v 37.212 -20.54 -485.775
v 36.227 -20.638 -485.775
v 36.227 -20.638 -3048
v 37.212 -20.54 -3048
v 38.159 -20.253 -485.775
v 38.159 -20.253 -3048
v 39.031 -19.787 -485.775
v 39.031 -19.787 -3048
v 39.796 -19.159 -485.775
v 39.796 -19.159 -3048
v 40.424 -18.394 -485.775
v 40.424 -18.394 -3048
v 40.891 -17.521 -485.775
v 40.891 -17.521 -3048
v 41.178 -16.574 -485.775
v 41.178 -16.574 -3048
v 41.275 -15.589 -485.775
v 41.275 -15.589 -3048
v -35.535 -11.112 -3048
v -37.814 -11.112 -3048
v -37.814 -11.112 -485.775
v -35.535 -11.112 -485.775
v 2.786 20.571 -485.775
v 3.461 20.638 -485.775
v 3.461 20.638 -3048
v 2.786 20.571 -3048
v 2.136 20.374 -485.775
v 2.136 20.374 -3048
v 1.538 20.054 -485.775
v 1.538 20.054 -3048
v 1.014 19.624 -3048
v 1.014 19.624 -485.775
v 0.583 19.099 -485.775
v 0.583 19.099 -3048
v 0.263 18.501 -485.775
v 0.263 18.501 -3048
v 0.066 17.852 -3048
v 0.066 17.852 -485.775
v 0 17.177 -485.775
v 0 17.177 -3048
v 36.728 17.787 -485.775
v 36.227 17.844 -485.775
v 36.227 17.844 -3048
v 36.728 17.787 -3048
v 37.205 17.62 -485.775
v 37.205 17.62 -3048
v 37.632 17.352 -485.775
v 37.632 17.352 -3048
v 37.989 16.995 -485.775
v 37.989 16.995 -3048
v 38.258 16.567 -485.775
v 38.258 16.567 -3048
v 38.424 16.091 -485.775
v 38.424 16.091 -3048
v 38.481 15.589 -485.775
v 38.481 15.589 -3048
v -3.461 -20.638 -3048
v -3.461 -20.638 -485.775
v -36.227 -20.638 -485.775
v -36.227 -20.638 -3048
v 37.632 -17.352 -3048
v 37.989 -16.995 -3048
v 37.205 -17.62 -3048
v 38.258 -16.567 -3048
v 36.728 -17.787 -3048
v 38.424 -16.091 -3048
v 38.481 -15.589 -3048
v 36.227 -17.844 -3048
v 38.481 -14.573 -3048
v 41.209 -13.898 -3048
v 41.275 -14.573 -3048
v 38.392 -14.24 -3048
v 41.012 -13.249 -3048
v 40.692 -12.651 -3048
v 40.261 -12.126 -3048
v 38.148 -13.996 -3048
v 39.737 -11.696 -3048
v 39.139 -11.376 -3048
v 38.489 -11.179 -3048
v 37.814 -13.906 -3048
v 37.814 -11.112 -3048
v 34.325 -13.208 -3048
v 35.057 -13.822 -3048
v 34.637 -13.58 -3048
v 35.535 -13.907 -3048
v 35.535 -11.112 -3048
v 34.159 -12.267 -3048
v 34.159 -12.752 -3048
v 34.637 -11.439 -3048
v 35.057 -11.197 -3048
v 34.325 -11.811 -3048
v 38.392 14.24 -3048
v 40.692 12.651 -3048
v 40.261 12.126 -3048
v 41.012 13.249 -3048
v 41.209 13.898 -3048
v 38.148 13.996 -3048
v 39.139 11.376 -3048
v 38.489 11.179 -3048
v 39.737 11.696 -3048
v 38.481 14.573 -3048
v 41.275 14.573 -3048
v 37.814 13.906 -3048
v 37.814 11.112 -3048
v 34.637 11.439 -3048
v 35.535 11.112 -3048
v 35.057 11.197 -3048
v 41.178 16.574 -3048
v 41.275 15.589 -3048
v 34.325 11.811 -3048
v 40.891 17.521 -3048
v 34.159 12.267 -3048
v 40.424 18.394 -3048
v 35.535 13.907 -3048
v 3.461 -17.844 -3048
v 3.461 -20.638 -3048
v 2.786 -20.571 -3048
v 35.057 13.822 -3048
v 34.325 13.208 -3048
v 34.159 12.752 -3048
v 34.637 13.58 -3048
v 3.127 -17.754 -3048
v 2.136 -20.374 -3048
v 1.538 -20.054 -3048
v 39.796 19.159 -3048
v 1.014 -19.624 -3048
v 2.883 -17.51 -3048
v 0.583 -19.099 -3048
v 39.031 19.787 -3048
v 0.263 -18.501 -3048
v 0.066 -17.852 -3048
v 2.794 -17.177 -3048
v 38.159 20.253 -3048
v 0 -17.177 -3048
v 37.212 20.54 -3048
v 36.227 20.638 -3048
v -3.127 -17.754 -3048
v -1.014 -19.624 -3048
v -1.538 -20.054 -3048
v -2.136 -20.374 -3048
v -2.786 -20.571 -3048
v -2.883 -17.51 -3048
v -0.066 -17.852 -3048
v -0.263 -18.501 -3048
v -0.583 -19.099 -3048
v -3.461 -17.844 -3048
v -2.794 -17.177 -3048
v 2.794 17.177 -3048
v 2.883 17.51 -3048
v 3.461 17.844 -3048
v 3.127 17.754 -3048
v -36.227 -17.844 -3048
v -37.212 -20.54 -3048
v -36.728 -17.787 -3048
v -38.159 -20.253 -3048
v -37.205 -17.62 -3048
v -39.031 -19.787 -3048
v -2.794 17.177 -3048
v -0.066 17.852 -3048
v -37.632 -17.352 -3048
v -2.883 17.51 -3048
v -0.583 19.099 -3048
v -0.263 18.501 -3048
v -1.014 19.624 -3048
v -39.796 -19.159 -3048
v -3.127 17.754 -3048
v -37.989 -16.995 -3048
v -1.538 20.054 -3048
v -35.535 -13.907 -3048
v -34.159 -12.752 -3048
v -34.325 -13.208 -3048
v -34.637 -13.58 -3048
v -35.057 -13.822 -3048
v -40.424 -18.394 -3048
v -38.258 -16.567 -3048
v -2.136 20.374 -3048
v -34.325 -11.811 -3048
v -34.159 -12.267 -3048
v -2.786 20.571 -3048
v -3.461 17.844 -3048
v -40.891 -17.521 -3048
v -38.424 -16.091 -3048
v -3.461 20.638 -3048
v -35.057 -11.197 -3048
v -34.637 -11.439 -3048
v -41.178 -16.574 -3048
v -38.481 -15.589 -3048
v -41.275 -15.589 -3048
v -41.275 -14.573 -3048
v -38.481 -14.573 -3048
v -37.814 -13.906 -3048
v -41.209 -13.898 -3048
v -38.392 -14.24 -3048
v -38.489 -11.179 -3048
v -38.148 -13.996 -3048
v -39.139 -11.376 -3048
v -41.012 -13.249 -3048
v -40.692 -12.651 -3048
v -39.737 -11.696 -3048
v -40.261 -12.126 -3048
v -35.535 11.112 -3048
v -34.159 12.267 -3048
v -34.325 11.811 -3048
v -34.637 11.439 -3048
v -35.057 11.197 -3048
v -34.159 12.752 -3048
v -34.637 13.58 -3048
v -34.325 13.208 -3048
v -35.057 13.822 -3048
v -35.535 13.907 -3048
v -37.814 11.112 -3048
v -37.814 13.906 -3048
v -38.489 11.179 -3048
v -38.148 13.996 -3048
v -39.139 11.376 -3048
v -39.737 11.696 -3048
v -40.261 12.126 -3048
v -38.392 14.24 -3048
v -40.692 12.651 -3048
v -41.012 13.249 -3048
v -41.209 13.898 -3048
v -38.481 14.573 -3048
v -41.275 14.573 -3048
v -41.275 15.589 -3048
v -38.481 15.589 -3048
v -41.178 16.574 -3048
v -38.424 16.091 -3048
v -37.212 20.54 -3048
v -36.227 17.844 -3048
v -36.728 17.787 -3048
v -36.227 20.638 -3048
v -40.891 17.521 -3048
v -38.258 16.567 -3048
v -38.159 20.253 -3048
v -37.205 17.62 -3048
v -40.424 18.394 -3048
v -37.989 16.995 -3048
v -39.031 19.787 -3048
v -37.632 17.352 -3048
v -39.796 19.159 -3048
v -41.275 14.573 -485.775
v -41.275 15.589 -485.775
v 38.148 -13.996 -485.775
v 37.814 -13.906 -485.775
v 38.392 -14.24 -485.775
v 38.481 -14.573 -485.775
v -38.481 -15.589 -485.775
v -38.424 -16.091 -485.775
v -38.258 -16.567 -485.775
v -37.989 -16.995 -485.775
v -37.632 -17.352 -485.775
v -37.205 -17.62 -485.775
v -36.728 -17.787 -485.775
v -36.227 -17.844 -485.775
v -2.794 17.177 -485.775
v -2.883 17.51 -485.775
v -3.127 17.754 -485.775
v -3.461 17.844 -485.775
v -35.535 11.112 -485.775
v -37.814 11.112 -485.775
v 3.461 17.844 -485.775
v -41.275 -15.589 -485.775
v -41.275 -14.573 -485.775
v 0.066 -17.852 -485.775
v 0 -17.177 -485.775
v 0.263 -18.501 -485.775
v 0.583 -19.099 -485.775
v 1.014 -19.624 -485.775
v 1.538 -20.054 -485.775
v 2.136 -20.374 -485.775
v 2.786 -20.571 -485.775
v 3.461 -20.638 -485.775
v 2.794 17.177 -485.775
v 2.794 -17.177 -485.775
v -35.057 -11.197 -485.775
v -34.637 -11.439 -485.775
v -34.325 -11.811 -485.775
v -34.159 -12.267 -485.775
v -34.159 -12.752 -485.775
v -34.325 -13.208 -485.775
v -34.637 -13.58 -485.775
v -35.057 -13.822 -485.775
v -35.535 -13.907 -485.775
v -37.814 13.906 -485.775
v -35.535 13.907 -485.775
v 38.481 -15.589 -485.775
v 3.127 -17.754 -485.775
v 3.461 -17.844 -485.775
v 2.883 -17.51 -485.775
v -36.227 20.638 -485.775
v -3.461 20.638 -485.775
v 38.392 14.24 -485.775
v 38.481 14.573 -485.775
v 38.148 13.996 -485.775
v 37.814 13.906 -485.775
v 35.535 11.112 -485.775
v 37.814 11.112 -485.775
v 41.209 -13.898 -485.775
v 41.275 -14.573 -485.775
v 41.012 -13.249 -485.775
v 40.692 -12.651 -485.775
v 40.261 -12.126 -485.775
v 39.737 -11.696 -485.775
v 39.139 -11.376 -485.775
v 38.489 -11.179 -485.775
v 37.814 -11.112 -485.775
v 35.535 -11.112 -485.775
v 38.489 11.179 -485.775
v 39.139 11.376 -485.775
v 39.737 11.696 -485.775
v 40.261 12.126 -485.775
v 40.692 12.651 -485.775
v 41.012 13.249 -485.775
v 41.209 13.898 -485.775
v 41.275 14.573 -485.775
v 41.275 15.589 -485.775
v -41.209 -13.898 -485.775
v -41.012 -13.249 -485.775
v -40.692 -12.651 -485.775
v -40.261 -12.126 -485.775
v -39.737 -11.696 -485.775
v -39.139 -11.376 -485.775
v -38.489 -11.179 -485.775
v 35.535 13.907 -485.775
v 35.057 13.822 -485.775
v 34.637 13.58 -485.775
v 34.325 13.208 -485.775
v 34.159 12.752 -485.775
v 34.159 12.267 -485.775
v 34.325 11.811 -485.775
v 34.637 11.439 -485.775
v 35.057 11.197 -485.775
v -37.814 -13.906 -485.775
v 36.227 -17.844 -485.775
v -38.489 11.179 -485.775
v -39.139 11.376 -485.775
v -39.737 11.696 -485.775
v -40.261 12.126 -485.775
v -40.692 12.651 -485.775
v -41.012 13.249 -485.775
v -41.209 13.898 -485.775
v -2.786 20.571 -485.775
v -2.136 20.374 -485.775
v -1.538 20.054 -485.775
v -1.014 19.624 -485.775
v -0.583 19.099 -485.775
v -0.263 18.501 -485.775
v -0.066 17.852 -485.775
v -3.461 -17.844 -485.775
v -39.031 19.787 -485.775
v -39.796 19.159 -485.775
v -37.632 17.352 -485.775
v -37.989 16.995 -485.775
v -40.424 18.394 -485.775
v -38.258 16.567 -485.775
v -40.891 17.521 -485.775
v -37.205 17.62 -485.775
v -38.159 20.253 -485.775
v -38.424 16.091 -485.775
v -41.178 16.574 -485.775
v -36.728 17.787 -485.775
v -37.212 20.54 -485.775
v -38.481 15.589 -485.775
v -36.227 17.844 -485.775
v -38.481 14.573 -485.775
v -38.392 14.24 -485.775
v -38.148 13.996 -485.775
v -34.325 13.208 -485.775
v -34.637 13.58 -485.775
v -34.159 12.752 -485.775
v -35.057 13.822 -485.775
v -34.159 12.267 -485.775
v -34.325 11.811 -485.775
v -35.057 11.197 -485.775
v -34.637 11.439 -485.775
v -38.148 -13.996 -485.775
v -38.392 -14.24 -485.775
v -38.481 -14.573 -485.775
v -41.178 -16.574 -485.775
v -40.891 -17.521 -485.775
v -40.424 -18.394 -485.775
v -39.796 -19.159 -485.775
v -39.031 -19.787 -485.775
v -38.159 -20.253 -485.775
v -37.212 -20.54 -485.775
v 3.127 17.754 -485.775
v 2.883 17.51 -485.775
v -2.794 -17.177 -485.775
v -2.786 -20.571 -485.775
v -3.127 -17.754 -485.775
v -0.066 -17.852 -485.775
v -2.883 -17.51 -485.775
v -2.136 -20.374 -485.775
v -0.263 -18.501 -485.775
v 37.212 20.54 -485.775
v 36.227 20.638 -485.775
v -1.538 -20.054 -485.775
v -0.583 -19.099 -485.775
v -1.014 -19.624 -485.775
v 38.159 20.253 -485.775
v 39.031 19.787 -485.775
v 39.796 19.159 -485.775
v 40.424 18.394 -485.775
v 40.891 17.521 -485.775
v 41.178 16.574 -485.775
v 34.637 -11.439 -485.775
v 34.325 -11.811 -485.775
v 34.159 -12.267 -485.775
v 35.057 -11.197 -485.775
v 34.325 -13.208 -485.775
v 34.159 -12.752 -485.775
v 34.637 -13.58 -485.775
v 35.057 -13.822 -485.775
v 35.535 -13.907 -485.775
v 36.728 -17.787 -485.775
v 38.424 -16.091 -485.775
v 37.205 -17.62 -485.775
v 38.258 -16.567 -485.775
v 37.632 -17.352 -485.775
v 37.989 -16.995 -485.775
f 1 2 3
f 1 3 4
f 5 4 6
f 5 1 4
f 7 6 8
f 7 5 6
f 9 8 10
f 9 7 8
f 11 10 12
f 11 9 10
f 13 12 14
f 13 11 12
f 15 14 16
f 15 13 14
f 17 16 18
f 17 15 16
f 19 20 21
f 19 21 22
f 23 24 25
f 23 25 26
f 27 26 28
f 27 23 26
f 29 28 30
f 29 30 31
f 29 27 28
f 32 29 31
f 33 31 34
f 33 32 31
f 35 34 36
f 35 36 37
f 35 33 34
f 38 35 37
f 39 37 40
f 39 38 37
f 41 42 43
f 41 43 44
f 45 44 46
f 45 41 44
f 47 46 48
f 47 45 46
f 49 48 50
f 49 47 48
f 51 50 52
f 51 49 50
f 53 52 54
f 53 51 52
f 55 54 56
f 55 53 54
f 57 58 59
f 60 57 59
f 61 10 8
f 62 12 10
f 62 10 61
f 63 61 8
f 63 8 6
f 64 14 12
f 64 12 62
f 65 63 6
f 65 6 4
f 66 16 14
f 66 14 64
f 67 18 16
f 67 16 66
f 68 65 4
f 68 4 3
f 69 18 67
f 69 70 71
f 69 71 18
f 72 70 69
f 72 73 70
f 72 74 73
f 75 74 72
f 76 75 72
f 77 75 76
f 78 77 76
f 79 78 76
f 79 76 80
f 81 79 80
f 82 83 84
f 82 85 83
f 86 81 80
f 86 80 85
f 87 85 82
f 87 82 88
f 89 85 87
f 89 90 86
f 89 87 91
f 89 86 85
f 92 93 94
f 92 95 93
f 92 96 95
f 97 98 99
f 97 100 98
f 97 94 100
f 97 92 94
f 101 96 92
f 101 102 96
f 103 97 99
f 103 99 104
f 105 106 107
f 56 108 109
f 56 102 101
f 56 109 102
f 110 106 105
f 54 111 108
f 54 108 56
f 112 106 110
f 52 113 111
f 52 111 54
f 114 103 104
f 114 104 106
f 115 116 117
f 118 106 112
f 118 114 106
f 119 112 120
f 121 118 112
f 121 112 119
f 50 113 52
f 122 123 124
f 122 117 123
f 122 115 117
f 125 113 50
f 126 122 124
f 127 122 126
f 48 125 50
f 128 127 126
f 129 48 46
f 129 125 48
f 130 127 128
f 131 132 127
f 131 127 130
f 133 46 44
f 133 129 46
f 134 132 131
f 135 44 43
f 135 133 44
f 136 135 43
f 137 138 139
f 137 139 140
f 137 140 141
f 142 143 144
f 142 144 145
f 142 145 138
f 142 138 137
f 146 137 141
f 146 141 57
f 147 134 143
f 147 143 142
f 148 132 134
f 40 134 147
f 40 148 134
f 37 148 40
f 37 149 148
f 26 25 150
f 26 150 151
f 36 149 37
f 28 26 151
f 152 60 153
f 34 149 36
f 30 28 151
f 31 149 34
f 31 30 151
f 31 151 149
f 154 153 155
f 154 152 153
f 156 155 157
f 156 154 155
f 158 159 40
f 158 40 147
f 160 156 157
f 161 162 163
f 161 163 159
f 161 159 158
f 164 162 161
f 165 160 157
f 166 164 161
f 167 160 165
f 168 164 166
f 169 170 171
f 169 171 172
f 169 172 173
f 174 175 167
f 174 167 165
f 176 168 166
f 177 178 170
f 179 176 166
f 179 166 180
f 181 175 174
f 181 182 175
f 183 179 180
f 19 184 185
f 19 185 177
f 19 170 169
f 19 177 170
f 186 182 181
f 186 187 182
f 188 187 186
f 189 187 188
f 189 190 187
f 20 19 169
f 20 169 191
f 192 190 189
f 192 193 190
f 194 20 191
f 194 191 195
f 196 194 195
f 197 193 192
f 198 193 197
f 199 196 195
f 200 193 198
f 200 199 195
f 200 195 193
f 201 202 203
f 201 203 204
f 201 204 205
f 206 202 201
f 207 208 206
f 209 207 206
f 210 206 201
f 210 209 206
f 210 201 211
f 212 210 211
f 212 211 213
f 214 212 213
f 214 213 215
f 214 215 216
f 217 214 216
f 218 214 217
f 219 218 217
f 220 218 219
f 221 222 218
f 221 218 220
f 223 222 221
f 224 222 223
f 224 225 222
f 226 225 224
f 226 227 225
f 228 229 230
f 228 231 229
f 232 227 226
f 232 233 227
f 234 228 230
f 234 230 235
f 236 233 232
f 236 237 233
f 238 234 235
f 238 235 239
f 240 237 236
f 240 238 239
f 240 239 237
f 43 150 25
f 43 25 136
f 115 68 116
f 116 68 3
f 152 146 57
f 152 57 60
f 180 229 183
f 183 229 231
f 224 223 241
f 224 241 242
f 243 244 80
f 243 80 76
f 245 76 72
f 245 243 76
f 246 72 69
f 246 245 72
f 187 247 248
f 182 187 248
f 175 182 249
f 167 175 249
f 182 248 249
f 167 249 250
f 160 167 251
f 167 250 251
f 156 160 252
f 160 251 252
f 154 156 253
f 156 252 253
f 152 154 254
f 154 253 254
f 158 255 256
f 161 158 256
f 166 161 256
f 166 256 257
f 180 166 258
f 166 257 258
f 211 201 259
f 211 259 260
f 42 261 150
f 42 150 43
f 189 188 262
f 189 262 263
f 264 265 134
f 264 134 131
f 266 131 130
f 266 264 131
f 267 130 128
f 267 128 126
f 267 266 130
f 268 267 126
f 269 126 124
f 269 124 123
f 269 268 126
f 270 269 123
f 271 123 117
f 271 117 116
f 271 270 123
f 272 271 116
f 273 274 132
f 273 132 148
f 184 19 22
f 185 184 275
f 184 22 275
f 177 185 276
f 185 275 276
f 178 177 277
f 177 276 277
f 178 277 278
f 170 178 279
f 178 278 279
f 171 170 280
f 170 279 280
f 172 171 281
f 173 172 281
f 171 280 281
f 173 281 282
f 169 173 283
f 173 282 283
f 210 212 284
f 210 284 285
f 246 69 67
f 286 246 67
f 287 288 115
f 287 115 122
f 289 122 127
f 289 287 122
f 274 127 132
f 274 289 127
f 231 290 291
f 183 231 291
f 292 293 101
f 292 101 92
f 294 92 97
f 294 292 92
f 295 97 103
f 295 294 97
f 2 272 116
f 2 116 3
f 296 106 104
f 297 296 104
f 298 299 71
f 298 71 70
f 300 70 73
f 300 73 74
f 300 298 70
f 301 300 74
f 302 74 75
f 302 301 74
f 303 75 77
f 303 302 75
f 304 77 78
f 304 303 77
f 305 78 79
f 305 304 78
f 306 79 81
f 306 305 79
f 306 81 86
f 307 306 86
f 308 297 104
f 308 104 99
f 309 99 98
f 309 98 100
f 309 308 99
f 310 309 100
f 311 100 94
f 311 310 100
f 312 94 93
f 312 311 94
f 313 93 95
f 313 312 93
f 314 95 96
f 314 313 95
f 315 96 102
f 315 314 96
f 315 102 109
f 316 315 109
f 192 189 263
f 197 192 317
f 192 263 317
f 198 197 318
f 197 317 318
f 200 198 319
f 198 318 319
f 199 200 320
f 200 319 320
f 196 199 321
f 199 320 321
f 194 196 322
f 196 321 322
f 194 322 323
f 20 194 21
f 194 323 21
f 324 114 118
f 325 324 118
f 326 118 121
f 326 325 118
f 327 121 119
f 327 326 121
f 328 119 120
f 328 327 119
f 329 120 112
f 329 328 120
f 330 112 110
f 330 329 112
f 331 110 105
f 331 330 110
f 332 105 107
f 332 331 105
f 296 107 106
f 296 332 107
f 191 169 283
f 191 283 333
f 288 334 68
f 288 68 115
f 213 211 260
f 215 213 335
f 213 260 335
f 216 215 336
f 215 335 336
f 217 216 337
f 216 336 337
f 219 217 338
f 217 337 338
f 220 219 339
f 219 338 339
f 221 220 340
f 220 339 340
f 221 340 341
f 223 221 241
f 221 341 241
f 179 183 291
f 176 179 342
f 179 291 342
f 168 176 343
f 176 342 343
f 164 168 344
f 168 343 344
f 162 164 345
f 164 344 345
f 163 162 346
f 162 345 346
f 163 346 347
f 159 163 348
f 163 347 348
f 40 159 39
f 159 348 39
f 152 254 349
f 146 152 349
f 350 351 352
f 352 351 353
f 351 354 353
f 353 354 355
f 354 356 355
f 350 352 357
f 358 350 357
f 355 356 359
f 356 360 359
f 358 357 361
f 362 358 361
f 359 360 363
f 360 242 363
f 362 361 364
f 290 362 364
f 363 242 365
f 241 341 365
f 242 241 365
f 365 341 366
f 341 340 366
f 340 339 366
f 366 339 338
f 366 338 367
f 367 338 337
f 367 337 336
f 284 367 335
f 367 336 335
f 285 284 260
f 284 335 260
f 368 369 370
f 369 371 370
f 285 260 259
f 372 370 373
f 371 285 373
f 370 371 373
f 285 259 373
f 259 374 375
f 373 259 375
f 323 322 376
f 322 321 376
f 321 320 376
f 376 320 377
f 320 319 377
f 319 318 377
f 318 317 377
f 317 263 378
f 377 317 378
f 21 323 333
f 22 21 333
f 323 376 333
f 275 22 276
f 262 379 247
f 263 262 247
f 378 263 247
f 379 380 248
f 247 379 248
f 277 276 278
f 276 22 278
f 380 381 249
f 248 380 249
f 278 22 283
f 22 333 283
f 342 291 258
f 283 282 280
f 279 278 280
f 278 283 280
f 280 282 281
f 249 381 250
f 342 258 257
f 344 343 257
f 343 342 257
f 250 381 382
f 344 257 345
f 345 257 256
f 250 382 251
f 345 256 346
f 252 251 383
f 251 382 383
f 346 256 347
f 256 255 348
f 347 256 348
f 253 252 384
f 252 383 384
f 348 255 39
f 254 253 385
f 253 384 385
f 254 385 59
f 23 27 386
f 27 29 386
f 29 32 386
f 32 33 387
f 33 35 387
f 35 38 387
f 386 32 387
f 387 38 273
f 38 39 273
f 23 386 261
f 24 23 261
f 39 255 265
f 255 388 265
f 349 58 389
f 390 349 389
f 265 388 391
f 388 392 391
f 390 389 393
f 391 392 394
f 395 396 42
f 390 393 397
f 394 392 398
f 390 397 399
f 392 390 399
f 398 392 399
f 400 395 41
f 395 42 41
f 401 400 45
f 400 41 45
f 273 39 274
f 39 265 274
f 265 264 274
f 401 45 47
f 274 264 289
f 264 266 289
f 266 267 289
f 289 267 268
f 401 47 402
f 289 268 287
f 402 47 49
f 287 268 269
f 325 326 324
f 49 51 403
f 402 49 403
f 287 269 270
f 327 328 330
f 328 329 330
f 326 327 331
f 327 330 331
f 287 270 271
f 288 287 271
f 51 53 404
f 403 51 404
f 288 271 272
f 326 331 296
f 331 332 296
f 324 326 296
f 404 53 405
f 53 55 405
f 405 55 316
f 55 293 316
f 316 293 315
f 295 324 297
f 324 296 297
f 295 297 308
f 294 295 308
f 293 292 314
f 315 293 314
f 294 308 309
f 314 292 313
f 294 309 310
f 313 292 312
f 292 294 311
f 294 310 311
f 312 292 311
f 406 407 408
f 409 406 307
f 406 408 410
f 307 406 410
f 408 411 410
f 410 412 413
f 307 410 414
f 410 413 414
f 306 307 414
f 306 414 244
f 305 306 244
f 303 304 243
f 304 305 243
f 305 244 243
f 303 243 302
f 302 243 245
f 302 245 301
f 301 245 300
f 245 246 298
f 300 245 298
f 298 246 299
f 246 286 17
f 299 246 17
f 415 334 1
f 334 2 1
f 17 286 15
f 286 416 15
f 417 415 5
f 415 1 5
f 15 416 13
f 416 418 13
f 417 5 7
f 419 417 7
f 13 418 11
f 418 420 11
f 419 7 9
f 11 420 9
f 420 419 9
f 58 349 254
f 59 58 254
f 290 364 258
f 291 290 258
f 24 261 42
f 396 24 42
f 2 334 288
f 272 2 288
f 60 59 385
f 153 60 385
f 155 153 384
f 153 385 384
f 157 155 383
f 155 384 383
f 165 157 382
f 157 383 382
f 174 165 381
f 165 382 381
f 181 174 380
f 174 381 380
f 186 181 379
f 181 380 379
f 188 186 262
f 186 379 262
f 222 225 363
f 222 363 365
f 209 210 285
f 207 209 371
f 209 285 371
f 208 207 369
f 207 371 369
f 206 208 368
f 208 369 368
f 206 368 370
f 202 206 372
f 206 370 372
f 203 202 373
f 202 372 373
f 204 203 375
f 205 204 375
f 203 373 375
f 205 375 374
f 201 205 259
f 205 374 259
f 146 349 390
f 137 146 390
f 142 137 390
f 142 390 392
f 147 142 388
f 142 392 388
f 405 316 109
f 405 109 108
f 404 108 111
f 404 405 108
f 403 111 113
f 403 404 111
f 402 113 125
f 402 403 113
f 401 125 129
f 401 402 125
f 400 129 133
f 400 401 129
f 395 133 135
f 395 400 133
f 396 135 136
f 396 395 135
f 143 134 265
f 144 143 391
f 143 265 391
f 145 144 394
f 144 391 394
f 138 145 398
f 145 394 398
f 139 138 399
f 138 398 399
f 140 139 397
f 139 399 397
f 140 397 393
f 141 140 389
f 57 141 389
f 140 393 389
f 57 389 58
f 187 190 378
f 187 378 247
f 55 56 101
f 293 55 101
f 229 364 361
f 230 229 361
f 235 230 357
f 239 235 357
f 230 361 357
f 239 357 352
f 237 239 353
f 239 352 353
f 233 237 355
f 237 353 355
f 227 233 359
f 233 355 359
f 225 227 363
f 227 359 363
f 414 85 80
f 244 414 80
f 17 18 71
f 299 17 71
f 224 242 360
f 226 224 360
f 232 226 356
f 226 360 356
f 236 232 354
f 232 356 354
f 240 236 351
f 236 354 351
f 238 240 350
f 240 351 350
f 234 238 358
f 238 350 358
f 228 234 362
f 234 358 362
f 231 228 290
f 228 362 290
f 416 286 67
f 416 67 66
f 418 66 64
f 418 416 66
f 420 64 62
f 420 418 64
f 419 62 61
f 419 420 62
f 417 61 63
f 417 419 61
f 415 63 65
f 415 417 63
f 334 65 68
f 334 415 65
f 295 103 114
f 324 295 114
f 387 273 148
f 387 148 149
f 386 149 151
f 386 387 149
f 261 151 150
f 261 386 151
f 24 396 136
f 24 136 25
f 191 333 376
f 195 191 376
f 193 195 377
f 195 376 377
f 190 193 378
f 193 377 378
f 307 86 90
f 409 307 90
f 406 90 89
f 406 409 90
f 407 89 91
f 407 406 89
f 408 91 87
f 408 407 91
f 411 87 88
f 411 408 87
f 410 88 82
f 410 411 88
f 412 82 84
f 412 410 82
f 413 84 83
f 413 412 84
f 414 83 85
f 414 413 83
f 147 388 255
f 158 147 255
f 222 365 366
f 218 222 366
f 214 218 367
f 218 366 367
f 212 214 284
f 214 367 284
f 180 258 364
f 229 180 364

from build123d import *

# Parameters (mm, degrees)
BOSS_EXTRUDE1_DEPTH = 3048
SKETCH4_W           = 82.55
SKETCH4_H           = 485.775
CUT_EXTRUDE1_DEPTH  = 3049.558881053


with BuildPart() as part:
    # Sketch1 → Boss-Extrude1 (new body)
    with BuildSketch(Plane.XY):
        with BuildLine():
            Line((-36.22675, 20.6375), (-3.46075, 20.6375))
            ThreePointArc((-3.46075, 20.6375), (-1.013630207, 19.623869793), (0, 17.17675))
            Line((0, 17.17675), (0, -17.17675))
            ThreePointArc((0, -17.17675), (-1.013630207, -19.623869793), (-3.46075, -20.6375))
            Line((-3.46075, -20.6375), (-36.22675, -20.6375))
            ThreePointArc((-36.22675, -20.6375), (-39.796401808, -19.158901808), (-41.275, -15.58925))
            Line((-41.275, -15.58925), (-41.275, -14.57325))
            ThreePointArc((-41.275, -14.57325), (-40.261369793, -12.126130207), (-37.81425, -11.1125))
            Line((-37.81425, -11.1125), (-35.5346, -11.1125))
            ThreePointArc((-35.5346, -11.1125), (-34.1376, -12.5095), (-35.5346, -13.9065))
            Line((-35.5346, -13.9065), (-37.81425, -13.9065))
            ThreePointArc((-37.81425, -13.9065), (-38.285713446, -14.101786554), (-38.481, -14.57325))
            Line((-38.481, -14.57325), (-38.481, -15.58925))
            ThreePointArc((-38.481, -15.58925), (-37.820745461, -17.183245461), (-36.22675, -17.8435))
            Line((-36.22675, -17.8435), (-3.46075, -17.8435))
            ThreePointArc((-3.46075, -17.8435), (-2.989286554, -17.648213446), (-2.794, -17.17675))
            Line((-2.794, -17.17675), (-2.794, 17.17675))
            ThreePointArc((-2.794, 17.17675), (-2.989286554, 17.648213446), (-3.46075, 17.8435))
            Line((-3.46075, 17.8435), (-36.22675, 17.8435))
            ThreePointArc((-36.22675, 17.8435), (-37.820745461, 17.183245461), (-38.481, 15.58925))
            Line((-38.481, 15.58925), (-38.481, 14.57325))
            ThreePointArc((-38.481, 14.57325), (-38.285713446, 14.101786554), (-37.81425, 13.9065))
            Line((-37.81425, 13.9065), (-35.5346, 13.9065))
            ThreePointArc((-35.5346, 13.9065), (-34.1376, 12.5095), (-35.5346, 11.1125))
            Line((-35.5346, 11.1125), (-37.81425, 11.1125))
            ThreePointArc((-37.81425, 11.1125), (-40.261369793, 12.126130207), (-41.275, 14.57325))
            Line((-41.275, 14.57325), (-41.275, 15.58925))
            ThreePointArc((-41.275, 15.58925), (-39.796401808, 19.158901808), (-36.22675, 20.6375))
        make_face()
    extrude(amount=-BOSS_EXTRUDE1_DEPTH)


with BuildPart() as body_2:
    # Mirror1: mirrored copy
    add(part.part.mirror(Plane(origin=(0, 17.17675, -3048), x_dir=(0, 0, 1), z_dir=(1, 0, 0))))


with BuildPart() as cut_extrude1_tool:
    # Sketch4 → Cut-Extrude1 (new, through all)
    with BuildSketch(Plane.XZ.offset(20.6375)):
        with Locations((0, -242.8875)):
            Rectangle(SKETCH4_W, SKETCH4_H)
    extrude(amount=-CUT_EXTRUDE1_DEPTH)


with BuildPart() as part_1:
    add(part.part)

    # Cut-Extrude1: cut by cut_extrude1_tool
    add(cut_extrude1_tool.part, mode=Mode.SUBTRACT)


with BuildPart() as body_2_1:
    add(body_2.part)

    # Cut-Extrude1: cut by cut_extrude1_tool
    add(cut_extrude1_tool.part, mode=Mode.SUBTRACT)

    # Combine1: union part
    add(part_1.part)


solid = body_2_1.part
